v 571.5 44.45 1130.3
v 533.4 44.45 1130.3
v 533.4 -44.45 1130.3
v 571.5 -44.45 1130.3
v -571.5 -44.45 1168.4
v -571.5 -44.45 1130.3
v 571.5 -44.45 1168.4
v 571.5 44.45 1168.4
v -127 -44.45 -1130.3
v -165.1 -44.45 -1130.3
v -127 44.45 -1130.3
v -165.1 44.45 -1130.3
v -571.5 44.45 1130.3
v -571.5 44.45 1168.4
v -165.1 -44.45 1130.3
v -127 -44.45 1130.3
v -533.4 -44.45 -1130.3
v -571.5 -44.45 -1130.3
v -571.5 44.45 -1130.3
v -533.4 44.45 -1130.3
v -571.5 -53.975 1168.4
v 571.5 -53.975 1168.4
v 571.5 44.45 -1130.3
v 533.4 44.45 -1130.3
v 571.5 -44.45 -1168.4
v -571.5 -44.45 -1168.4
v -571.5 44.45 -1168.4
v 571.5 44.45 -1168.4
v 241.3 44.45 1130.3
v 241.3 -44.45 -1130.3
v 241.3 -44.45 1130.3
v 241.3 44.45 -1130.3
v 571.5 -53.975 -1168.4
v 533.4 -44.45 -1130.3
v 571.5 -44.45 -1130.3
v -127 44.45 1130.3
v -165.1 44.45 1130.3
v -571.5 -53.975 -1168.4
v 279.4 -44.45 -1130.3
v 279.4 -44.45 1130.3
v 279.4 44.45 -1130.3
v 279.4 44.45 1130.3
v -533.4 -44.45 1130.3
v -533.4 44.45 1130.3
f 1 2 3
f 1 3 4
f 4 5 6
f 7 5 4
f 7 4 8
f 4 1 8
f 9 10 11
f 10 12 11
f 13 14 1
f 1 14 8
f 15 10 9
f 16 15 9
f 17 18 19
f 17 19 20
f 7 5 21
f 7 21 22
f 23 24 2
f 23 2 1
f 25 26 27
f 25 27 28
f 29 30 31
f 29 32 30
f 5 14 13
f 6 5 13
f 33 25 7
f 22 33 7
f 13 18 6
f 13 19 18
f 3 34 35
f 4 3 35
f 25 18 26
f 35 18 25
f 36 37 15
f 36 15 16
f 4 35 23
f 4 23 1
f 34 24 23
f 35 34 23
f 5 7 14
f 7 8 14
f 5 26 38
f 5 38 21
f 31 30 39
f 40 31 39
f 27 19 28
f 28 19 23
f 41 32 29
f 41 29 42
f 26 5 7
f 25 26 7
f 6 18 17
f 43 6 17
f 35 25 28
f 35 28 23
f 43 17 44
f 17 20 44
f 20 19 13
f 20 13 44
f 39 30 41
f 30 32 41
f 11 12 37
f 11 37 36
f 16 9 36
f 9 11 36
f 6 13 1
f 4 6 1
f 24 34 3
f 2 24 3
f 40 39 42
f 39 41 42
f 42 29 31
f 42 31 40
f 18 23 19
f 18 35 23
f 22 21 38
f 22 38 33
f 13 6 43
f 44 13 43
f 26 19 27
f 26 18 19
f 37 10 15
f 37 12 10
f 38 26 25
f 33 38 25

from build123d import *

# Parameters (mm, degrees)
F1_DEPTH = 44.45
F0_W     = 38.1
F0_H     = 2260.6
F2_DEPTH = 44.45
F3_W     = 1143
F3_H     = 2336.8
F4_DEPTH = 9.525


with BuildPart() as f1:
    # F0 (on Front) → F1 (new body, symmetric)
    with BuildSketch(Plane.XZ):
        Polygon((-571.5, 1130.3), (-533.4, 1130.3), (-165.1, 1130.3), (-127, 1130.3), (241.3, 1130.3), (279.4, 1130.3), (533.4, 1130.3), (571.5, 1130.3), (571.5, 1168.4), (-571.5, 1168.4), align=None)
        Polygon((-165.1, -1130.3), (-533.4, -1130.3), (-571.5, -1130.3), (-571.5, -1168.4), (571.5, -1168.4), (571.5, -1130.3), (533.4, -1130.3), (279.4, -1130.3), (241.3, -1130.3), (-127, -1130.3), align=None)
    extrude(amount=F1_DEPTH, both=True)


with BuildPart() as f2:
    # F0 (on Front) → F2 (new body, symmetric)
    with BuildSketch(Plane.XZ):
        with Locations((-552.45, 0)):
            Rectangle(F0_W, F0_H)
        with Locations((-146.05, 0)):
            Rectangle(F0_W, F0_H)
        with Locations((260.35, 0)):
            Rectangle(F0_W, F0_H)
        with Locations((552.45, 0)):
            Rectangle(F0_W, F0_H)
    extrude(amount=F2_DEPTH, both=True)


with BuildPart() as f4:
    # F3 (on face) → F4 (new body)
    with BuildSketch(Plane.XZ.offset(44.45)):
        Rectangle(F3_W, F3_H)
    extrude(amount=F4_DEPTH)


solid = Compound([f1.part, f2.part, f4.part])
